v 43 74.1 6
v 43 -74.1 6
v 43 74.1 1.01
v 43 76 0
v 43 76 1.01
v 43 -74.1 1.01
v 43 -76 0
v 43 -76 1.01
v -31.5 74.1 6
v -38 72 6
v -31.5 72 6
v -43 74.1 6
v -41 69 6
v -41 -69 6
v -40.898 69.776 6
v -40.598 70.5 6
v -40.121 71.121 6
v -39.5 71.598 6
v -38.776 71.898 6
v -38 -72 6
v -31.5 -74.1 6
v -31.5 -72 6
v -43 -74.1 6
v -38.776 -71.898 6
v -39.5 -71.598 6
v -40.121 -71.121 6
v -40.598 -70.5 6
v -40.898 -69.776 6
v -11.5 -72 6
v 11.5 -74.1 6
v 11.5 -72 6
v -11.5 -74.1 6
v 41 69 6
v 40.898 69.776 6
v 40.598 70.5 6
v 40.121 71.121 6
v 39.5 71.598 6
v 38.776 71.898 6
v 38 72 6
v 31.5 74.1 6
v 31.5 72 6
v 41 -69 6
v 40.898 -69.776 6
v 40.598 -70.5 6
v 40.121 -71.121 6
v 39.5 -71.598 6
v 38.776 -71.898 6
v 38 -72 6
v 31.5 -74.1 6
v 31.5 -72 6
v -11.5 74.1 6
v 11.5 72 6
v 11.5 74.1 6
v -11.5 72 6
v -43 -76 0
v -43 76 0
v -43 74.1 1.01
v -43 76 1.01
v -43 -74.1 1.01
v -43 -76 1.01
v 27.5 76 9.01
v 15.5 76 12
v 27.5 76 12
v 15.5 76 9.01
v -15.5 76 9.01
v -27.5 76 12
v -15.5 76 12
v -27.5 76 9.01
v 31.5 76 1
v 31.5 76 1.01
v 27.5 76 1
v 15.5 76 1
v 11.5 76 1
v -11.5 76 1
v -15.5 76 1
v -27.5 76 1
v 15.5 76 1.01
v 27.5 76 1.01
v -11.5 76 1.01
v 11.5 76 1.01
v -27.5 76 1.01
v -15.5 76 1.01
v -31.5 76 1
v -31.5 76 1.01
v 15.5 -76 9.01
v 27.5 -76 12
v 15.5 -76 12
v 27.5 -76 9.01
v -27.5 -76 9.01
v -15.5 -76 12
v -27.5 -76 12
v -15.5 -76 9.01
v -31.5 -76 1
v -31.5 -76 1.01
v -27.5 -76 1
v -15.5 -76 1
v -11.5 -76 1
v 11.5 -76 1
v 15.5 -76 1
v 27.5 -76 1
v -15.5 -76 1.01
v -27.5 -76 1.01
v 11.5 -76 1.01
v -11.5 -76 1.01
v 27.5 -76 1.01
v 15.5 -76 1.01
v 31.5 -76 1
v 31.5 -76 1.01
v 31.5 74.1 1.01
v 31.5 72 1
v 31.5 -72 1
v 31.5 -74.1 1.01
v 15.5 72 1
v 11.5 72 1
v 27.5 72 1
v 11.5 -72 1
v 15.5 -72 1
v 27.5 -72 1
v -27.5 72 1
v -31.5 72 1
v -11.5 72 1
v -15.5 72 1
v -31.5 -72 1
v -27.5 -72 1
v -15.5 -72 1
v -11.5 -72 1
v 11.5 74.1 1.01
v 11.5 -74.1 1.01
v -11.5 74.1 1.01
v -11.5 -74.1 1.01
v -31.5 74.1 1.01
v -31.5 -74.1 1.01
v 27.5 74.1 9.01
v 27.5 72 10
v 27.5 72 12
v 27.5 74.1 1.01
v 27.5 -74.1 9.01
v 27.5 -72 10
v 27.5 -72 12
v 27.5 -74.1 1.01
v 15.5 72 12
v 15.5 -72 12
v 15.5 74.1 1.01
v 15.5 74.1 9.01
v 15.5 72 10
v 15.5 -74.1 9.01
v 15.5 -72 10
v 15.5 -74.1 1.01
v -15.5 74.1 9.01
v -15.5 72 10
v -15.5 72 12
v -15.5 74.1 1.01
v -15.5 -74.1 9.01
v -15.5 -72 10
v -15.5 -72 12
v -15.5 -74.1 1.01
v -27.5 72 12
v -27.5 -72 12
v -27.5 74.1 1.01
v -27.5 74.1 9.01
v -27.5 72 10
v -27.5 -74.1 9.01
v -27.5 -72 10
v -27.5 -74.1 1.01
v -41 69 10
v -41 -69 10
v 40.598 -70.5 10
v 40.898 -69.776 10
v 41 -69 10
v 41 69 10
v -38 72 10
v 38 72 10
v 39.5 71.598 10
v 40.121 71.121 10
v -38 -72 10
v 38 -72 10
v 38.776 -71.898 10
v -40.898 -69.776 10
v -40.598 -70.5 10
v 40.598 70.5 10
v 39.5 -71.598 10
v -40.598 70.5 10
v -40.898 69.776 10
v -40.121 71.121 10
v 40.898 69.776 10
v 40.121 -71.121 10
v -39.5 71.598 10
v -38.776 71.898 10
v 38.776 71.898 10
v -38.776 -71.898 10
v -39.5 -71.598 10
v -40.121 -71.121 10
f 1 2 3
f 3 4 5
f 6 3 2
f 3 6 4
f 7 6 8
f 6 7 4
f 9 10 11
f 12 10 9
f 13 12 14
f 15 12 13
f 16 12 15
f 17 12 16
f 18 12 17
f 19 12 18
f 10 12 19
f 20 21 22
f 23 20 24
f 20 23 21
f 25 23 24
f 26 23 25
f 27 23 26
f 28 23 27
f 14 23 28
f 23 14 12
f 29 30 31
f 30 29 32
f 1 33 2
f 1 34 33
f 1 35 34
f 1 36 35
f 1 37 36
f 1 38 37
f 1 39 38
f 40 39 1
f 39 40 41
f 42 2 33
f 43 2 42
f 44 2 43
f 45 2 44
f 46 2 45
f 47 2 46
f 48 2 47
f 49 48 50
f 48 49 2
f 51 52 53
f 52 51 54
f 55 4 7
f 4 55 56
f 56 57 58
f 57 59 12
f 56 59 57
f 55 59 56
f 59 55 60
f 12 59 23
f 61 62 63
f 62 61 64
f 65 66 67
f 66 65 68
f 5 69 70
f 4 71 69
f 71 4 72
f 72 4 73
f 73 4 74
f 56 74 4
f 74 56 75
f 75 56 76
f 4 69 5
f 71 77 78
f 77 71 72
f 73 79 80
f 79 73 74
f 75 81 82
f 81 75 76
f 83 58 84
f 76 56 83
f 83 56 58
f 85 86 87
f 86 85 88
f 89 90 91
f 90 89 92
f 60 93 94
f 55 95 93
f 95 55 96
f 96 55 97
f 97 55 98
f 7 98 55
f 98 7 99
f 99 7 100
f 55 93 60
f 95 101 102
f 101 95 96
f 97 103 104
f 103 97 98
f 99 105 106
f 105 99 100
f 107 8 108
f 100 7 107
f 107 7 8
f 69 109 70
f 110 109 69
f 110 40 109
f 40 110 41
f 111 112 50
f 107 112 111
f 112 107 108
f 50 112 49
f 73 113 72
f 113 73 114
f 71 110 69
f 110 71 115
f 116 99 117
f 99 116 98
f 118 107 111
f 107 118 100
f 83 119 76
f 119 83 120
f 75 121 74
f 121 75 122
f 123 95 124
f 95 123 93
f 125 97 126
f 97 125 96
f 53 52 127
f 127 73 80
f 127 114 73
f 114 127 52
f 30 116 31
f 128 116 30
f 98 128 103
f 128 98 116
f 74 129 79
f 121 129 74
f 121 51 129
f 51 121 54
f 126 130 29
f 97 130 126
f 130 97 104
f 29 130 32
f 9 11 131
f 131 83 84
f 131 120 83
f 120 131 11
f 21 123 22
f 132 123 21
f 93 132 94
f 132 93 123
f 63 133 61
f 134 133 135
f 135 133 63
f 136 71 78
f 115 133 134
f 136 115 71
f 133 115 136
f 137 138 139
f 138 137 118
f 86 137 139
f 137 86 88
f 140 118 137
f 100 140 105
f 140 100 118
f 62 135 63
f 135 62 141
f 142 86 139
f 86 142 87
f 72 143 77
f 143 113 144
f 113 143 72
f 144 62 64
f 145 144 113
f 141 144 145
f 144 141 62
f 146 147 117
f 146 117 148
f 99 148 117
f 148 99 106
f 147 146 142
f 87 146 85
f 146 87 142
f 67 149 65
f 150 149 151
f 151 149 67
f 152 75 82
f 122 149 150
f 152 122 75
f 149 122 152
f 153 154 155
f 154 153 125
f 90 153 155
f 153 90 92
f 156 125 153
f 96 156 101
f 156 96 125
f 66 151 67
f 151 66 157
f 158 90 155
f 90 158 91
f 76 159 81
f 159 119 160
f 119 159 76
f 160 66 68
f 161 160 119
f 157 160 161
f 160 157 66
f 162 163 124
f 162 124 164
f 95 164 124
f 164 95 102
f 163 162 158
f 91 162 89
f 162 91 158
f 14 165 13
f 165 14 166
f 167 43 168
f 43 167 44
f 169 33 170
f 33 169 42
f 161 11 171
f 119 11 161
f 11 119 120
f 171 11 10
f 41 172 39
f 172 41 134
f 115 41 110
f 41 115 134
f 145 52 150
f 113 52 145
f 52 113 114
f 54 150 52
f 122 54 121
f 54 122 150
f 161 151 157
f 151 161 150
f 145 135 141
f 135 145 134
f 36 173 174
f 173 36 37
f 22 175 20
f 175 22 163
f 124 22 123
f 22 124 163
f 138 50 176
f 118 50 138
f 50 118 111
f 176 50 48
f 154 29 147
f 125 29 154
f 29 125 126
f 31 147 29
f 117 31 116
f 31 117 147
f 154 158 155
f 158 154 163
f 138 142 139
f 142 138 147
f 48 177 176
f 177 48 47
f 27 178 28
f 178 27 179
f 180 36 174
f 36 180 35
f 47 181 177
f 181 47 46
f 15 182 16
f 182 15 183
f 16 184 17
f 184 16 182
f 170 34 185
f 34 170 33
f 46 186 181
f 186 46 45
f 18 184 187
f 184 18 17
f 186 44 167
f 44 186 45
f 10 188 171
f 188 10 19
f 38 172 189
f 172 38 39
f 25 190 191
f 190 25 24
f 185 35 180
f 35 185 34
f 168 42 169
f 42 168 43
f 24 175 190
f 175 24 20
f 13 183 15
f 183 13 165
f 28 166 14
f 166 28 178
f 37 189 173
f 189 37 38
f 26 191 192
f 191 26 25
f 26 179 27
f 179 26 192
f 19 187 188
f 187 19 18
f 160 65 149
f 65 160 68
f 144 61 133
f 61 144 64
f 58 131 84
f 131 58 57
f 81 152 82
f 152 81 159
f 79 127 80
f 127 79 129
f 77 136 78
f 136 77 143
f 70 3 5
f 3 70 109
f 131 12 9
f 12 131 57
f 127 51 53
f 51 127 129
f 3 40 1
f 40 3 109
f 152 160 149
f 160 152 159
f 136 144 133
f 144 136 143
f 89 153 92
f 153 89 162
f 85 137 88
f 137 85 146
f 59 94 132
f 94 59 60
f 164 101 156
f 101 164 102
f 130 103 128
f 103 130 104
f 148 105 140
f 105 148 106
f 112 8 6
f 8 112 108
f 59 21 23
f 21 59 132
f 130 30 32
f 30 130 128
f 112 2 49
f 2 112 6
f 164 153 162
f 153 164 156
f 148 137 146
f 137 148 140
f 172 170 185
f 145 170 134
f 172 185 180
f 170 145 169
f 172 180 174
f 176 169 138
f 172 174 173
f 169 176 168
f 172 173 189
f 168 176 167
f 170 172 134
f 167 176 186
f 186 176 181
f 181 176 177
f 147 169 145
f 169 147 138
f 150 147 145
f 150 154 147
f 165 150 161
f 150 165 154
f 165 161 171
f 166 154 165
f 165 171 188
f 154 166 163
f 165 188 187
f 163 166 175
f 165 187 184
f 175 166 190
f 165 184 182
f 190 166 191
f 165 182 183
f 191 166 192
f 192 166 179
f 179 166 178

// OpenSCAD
// file: ../OpenSCAD_Modules/cube_vround.scad
module cube_vround(
	size=[10,10,10],
	round_corners=[true,true,true,true],
	rounding=3,
	center_xy=false,
	center_z=false,
	attach=0,
	wall_attach=0,
	quality=2, //integer from 1 to infinity
)
{
	assert(len(size)==3);
	assert(len(round_corners)==4);
	assert(rounding>0);
	assert(rounding<=size[0]/2);
	assert(rounding<=size[1]/2);
	assert(quality>0);
	assert(attach>=0);
	assert(wall_attach>=0);
	height=size[2]+attach;
	cyl_r=rounding+wall_attach;
	cyl_mvx=size[0]/2-rounding;
	cyl_mvy=size[1]/2-rounding;
	cube_szx=size[0]/2;
	cube_szy=size[1]/2;
	cube_mvx=cube_szx/2+wall_attach;
	cube_mvy=cube_szy/2+wall_attach;
	translate([center_xy?0:cube_szx,center_xy?0:cube_szy,center_z?-attach/2:(size[2]-attach)/2])
		hull()
		{
			if(round_corners[0])
				translate([cyl_mvx,cyl_mvy])
					cylinder(r=cyl_r,h=height,$fn=12*quality,center=true);
			else
				translate([cube_mvx,cube_mvy])
					cube([cube_szx,cube_szy,height],center=true);
			if(round_corners[1])
				translate([cyl_mvx,-cyl_mvy])
					cylinder(r=cyl_r,h=height,$fn=12*quality,center=true);
			else
				translate([cube_mvx,-cube_mvy])
					cube([cube_szx,cube_szy,height],center=true);
			if(round_corners[2])
				translate([-cyl_mvx,-cyl_mvy])
					cylinder(r=cyl_r,h=height,$fn=12*quality,center=true);
			else
				translate([-cube_mvx,-cube_mvy])
					cube([cube_szx,cube_szy,height],center=true);
			if(round_corners[3])
				translate([-cyl_mvx,cyl_mvy])
					cylinder(r=cyl_r,h=height,$fn=12*quality,center=true);
			else
				translate([-cube_mvx,cube_mvy])
					cube([cube_szx,cube_szy,height],center=true);
		};
}

//example
cube_vround(round_corners=[true,false,true,false],
size=[10,20,6],
attach=0.1,
wall_attach=0.1,
rounding=3,
center_xy=true,center_z=false);
// main file
use <../OpenSCAD_Modules/cube_vround.scad>

module xl_double_cover(
	quality=2, //integer from 1 to infinity
)
{
	ext_len=152;
	ext_width=86;
	wall_sz=2;
	
	main_height=6;
	base_hieght=1;
	clip_cut=20;
	clip_width=12;
	clip_height=12;
	size_int_depth=2;
	int_len=ext_len-size_int_depth*2-wall_sz*2;
	clip_int_height=8;

	difference()
	{
		union()
		{
			//base
			difference()
			{
				translate([0,0,main_height/2])
					cube([ext_width,ext_len,main_height],center=true);
				translate([ext_width/4,0,main_height/2+base_hieght])
					cube([clip_cut,ext_len+0.1,main_height],center=true);
				translate([-ext_width/4,0,main_height/2+base_hieght])
					cube([clip_cut,ext_len+0.1,main_height],center=true);
			}
			translate([ext_width/4,0,clip_height/2])
				cube([clip_width,ext_len,clip_height],center=true);
			translate([-ext_width/4,0,clip_height/2])
				cube([clip_width,ext_len,clip_height],center=true);
		}
		translate([0,0,base_hieght])
			cube_vround(size=[ext_width-wall_sz*2,int_len,clip_height],center_xy=true,quality=quality);
		translate([0,ext_len/2-size_int_depth/2+0.1,base_hieght+clip_int_height/2+0.01])
			cube(size=[ext_width+1,size_int_depth,clip_int_height],center=true);
		translate([0,-(ext_len/2-size_int_depth/2+0.1),base_hieght+clip_int_height/2+0.01])
			cube(size=[ext_width+1,size_int_depth,clip_int_height],center=true);
	}
}

module xl_double_cover_cut(
	quality=2, //integer from 1 to infinity
)
{
	base_hieght=1;
	clip_height=10;
	
	ext_len=152;
	ext_width=86;
	wall_sz=2;
	size_int_depth=2;
	int_len=ext_len-size_int_depth*2-wall_sz*2;
	
	cube_vround(size=[ext_width-wall_sz*2,int_len,clip_height],center_xy=true,quality=quality);
}

xl_double_cover();
xl_double_cover_cut();
